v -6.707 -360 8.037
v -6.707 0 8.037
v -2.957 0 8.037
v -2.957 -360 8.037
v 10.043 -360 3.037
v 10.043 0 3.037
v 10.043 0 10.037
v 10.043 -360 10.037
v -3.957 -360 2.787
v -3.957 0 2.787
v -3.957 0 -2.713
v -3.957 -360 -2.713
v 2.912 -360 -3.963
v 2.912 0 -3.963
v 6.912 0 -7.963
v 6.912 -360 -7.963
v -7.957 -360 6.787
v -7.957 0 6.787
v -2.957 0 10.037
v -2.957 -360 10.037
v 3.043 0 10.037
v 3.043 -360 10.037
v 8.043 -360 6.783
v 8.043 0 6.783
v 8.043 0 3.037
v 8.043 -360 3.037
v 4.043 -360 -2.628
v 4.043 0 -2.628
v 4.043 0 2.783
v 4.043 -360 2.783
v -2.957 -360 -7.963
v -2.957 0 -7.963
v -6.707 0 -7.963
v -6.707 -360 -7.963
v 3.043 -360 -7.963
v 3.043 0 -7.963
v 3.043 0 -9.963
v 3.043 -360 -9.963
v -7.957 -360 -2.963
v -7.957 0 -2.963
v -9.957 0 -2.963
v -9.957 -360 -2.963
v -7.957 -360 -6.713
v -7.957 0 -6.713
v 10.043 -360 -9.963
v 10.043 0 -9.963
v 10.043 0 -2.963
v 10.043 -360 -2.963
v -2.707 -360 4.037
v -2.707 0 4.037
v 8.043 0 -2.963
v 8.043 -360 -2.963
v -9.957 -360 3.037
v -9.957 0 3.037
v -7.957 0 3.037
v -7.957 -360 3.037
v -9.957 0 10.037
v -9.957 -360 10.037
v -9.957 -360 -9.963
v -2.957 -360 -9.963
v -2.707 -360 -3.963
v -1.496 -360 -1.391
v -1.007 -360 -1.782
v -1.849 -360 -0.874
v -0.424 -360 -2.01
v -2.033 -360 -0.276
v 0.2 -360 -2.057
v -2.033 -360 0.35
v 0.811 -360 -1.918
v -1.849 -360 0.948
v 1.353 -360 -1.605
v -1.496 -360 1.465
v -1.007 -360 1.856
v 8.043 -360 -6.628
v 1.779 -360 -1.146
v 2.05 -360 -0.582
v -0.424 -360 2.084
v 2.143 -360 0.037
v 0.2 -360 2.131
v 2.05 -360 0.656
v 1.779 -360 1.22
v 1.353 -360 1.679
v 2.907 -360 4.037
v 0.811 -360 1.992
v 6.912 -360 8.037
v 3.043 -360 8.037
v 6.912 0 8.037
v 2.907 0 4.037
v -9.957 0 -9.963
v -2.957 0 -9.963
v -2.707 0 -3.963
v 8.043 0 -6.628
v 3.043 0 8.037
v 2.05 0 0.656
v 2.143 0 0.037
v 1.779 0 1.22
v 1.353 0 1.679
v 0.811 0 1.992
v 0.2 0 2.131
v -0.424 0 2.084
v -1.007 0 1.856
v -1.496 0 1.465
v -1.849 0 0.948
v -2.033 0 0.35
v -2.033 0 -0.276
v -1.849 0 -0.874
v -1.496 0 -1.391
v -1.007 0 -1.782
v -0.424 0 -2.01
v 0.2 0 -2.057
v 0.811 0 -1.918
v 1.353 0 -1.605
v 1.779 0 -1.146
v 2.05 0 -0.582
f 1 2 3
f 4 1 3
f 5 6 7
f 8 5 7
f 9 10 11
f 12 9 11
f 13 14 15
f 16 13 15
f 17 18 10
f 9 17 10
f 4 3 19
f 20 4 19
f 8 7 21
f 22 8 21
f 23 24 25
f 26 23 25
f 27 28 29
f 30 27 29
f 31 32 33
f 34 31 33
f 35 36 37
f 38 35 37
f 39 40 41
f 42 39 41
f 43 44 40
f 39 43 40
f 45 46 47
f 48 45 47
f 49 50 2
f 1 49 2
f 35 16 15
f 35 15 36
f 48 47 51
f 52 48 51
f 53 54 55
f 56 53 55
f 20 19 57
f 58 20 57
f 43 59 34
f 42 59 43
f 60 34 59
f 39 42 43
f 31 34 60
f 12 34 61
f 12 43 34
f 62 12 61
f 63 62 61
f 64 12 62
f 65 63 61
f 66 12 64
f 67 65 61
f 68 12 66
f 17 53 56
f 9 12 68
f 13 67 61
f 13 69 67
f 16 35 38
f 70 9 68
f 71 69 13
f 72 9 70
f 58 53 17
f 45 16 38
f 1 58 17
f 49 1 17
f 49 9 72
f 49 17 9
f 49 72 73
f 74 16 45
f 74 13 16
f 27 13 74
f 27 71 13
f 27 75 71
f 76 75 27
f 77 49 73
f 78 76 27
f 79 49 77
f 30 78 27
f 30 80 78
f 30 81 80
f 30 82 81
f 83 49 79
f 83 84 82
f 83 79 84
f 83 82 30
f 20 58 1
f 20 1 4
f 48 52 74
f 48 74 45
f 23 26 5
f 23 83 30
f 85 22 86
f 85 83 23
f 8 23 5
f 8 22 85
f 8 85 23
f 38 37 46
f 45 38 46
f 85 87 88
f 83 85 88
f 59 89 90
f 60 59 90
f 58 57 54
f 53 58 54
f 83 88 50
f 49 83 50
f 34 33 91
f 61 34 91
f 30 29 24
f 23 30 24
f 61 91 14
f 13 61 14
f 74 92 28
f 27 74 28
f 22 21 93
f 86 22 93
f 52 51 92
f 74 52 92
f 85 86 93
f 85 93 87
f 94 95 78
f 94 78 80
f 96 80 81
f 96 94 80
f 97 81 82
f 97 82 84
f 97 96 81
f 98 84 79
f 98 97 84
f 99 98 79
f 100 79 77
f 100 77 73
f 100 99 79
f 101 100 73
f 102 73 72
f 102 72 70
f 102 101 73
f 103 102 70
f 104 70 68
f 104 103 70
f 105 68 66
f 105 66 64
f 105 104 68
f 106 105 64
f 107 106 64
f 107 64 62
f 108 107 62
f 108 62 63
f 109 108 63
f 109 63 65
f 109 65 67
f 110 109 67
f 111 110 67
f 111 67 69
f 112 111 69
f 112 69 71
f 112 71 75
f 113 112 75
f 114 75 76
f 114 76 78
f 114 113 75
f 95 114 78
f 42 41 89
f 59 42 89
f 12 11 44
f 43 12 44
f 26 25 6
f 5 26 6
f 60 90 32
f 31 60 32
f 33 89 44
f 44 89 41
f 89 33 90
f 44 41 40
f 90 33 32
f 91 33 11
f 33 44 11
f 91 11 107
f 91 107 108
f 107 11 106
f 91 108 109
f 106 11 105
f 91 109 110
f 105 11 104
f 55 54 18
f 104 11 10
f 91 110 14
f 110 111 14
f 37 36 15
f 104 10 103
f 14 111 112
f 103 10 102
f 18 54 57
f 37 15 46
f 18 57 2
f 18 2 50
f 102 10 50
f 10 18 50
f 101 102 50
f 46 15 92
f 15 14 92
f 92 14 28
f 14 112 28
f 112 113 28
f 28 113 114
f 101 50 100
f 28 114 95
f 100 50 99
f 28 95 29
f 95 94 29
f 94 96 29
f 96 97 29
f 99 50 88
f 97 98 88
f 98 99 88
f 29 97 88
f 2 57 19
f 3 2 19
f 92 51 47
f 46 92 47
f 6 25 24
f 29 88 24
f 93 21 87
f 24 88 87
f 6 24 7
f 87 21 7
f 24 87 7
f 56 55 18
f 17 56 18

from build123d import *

# Parameters (mm, degrees)
F0_R     = 2.1
F1_DEPTH = 360


with BuildPart() as f1:
    # F0 (on Front) → F1 (new body)
    with BuildSketch(Plane.XZ):
        Polygon((3.043448, -9.963036), (10.043448, -9.963036), (10.043448, -2.963036), (8.043448, -2.963036), (8.043448, -6.628225), (4.043448, -2.628225), (4.043448, 2.783328), (8.043448, 6.783328), (8.043448, 3.036964), (10.043448, 3.036964), (10.043448, 10.036964), (3.043448, 10.036964), (3.043448, 8.036964), (6.911917, 8.036964), (2.906782, 4.036964), (-2.706552, 4.036964), (-6.706552, 8.036964), (-2.956552, 8.036964), (-2.956552, 10.036964), (-9.956552, 10.036964), (-9.956552, 3.036964), (-7.956552, 3.036964), (-7.956552, 6.786964), (-3.956552, 2.786964), (-3.956552, -2.713036), (-7.956552, -6.713036), (-7.956552, -2.963036), (-9.956552, -2.963036), (-9.956552, -9.963036), (-2.956552, -9.963036), (-2.956552, -7.963036), (-6.706552, -7.963036), (-2.706552, -3.963036), (2.911917, -3.963036), (6.911917, -7.963036), (3.043448, -7.963036), align=None)
        with Locations((0.043448, 0.036964)):
            Circle(F0_R, mode=Mode.SUBTRACT)
    extrude(amount=F1_DEPTH)


solid = f1.part
